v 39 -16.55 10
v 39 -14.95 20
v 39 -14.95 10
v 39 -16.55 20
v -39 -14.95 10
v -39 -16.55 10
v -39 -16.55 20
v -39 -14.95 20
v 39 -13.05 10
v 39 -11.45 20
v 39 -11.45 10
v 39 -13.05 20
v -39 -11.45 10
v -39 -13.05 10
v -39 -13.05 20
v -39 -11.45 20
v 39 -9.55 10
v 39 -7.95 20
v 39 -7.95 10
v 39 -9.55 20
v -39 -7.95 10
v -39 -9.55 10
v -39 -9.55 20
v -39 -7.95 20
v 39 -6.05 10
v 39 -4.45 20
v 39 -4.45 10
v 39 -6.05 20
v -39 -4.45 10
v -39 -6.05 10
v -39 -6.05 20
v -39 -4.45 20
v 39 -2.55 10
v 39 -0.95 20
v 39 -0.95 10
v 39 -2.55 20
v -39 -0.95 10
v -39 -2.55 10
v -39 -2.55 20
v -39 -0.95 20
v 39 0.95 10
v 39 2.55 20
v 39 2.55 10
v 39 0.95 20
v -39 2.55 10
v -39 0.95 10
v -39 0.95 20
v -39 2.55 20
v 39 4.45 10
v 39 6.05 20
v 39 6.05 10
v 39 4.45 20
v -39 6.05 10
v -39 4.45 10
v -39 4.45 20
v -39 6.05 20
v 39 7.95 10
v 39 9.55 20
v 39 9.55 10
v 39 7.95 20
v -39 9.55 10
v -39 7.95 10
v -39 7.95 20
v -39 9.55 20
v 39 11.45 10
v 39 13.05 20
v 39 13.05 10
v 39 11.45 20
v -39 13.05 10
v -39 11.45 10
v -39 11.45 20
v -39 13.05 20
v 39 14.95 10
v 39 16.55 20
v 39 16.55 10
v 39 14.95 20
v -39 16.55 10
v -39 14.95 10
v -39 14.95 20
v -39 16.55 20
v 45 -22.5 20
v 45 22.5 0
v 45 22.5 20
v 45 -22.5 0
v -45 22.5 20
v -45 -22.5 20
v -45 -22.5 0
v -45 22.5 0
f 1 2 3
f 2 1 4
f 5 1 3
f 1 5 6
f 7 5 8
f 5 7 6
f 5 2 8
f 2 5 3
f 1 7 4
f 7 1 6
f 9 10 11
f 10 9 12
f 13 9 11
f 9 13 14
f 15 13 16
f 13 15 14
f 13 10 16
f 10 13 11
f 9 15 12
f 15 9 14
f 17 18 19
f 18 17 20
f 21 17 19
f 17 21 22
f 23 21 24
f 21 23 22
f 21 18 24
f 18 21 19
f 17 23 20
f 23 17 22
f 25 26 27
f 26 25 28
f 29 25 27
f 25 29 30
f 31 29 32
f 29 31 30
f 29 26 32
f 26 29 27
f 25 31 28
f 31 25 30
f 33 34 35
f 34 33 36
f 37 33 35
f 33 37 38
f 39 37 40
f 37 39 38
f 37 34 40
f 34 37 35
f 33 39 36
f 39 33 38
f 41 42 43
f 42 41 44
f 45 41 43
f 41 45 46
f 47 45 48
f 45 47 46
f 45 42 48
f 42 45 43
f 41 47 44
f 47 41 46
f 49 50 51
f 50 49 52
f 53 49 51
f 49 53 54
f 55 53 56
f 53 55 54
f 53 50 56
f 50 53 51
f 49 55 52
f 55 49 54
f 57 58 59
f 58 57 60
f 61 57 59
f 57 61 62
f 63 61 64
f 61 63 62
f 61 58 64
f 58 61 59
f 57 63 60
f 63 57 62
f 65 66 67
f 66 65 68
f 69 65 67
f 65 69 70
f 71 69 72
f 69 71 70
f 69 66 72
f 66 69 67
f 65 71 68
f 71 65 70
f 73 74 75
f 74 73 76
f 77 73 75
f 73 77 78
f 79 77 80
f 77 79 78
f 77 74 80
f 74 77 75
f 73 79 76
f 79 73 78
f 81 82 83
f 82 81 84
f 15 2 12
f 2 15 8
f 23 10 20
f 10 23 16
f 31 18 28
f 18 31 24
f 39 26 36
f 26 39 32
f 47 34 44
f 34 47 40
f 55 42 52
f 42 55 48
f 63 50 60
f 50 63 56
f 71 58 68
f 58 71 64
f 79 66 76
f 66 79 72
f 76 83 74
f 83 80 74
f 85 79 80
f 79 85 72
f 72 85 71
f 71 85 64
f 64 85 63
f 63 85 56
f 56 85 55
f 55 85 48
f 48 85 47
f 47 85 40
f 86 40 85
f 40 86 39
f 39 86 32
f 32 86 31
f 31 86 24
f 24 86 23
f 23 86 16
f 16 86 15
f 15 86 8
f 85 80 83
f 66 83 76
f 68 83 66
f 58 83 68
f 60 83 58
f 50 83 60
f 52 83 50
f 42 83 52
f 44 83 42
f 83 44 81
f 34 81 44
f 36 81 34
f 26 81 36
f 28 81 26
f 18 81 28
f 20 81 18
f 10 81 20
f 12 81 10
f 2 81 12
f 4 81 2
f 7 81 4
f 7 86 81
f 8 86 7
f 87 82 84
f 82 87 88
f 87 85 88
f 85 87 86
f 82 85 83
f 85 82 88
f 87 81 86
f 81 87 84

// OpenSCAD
// Microscope slide drying rack
// Print orientation: base block on the bed (z = 0), slots open upward (+Z)

// ---------------- Parameters ----------------
block_len    = 90;    // base block length along X (mm)
block_wid    = 45;    // base block width along Y (mm)
block_h      = 20;    // base block height along Z (mm)

slot_count   = 10;    // number of slide slots
slot_len     = 77;    // slot length along X (mm)
slot_w       = 1.6;   // slot width along Y (mm)
slot_depth   = 10;    // slot depth from top face (mm)
slot_pitch   = 3.5;   // centre-to-centre slot spacing along Y (mm)

eps          = 0.5;   // overshoot of cutters past the top face (mm)

$fn = 64;

// ---------------- Model ----------------
difference() {
    // Base block, centred in X and Y, resting on z = 0
    translate([-block_len/2, -block_wid/2, 0])
        cube([block_len, block_wid, block_h]);

    // Parallel slot group, centred on the block in X and Y
    for (i = [0 : slot_count - 1]) {
        x_c = (i - (slot_count - 1)/2) * slot_pitch;   // slot centre in Y
        translate([-(slot_len/2 + eps), x_c - slot_w/2, block_h - slot_depth])
            cube([slot_len + 2*eps, slot_w, slot_depth + eps]);
    }
}
